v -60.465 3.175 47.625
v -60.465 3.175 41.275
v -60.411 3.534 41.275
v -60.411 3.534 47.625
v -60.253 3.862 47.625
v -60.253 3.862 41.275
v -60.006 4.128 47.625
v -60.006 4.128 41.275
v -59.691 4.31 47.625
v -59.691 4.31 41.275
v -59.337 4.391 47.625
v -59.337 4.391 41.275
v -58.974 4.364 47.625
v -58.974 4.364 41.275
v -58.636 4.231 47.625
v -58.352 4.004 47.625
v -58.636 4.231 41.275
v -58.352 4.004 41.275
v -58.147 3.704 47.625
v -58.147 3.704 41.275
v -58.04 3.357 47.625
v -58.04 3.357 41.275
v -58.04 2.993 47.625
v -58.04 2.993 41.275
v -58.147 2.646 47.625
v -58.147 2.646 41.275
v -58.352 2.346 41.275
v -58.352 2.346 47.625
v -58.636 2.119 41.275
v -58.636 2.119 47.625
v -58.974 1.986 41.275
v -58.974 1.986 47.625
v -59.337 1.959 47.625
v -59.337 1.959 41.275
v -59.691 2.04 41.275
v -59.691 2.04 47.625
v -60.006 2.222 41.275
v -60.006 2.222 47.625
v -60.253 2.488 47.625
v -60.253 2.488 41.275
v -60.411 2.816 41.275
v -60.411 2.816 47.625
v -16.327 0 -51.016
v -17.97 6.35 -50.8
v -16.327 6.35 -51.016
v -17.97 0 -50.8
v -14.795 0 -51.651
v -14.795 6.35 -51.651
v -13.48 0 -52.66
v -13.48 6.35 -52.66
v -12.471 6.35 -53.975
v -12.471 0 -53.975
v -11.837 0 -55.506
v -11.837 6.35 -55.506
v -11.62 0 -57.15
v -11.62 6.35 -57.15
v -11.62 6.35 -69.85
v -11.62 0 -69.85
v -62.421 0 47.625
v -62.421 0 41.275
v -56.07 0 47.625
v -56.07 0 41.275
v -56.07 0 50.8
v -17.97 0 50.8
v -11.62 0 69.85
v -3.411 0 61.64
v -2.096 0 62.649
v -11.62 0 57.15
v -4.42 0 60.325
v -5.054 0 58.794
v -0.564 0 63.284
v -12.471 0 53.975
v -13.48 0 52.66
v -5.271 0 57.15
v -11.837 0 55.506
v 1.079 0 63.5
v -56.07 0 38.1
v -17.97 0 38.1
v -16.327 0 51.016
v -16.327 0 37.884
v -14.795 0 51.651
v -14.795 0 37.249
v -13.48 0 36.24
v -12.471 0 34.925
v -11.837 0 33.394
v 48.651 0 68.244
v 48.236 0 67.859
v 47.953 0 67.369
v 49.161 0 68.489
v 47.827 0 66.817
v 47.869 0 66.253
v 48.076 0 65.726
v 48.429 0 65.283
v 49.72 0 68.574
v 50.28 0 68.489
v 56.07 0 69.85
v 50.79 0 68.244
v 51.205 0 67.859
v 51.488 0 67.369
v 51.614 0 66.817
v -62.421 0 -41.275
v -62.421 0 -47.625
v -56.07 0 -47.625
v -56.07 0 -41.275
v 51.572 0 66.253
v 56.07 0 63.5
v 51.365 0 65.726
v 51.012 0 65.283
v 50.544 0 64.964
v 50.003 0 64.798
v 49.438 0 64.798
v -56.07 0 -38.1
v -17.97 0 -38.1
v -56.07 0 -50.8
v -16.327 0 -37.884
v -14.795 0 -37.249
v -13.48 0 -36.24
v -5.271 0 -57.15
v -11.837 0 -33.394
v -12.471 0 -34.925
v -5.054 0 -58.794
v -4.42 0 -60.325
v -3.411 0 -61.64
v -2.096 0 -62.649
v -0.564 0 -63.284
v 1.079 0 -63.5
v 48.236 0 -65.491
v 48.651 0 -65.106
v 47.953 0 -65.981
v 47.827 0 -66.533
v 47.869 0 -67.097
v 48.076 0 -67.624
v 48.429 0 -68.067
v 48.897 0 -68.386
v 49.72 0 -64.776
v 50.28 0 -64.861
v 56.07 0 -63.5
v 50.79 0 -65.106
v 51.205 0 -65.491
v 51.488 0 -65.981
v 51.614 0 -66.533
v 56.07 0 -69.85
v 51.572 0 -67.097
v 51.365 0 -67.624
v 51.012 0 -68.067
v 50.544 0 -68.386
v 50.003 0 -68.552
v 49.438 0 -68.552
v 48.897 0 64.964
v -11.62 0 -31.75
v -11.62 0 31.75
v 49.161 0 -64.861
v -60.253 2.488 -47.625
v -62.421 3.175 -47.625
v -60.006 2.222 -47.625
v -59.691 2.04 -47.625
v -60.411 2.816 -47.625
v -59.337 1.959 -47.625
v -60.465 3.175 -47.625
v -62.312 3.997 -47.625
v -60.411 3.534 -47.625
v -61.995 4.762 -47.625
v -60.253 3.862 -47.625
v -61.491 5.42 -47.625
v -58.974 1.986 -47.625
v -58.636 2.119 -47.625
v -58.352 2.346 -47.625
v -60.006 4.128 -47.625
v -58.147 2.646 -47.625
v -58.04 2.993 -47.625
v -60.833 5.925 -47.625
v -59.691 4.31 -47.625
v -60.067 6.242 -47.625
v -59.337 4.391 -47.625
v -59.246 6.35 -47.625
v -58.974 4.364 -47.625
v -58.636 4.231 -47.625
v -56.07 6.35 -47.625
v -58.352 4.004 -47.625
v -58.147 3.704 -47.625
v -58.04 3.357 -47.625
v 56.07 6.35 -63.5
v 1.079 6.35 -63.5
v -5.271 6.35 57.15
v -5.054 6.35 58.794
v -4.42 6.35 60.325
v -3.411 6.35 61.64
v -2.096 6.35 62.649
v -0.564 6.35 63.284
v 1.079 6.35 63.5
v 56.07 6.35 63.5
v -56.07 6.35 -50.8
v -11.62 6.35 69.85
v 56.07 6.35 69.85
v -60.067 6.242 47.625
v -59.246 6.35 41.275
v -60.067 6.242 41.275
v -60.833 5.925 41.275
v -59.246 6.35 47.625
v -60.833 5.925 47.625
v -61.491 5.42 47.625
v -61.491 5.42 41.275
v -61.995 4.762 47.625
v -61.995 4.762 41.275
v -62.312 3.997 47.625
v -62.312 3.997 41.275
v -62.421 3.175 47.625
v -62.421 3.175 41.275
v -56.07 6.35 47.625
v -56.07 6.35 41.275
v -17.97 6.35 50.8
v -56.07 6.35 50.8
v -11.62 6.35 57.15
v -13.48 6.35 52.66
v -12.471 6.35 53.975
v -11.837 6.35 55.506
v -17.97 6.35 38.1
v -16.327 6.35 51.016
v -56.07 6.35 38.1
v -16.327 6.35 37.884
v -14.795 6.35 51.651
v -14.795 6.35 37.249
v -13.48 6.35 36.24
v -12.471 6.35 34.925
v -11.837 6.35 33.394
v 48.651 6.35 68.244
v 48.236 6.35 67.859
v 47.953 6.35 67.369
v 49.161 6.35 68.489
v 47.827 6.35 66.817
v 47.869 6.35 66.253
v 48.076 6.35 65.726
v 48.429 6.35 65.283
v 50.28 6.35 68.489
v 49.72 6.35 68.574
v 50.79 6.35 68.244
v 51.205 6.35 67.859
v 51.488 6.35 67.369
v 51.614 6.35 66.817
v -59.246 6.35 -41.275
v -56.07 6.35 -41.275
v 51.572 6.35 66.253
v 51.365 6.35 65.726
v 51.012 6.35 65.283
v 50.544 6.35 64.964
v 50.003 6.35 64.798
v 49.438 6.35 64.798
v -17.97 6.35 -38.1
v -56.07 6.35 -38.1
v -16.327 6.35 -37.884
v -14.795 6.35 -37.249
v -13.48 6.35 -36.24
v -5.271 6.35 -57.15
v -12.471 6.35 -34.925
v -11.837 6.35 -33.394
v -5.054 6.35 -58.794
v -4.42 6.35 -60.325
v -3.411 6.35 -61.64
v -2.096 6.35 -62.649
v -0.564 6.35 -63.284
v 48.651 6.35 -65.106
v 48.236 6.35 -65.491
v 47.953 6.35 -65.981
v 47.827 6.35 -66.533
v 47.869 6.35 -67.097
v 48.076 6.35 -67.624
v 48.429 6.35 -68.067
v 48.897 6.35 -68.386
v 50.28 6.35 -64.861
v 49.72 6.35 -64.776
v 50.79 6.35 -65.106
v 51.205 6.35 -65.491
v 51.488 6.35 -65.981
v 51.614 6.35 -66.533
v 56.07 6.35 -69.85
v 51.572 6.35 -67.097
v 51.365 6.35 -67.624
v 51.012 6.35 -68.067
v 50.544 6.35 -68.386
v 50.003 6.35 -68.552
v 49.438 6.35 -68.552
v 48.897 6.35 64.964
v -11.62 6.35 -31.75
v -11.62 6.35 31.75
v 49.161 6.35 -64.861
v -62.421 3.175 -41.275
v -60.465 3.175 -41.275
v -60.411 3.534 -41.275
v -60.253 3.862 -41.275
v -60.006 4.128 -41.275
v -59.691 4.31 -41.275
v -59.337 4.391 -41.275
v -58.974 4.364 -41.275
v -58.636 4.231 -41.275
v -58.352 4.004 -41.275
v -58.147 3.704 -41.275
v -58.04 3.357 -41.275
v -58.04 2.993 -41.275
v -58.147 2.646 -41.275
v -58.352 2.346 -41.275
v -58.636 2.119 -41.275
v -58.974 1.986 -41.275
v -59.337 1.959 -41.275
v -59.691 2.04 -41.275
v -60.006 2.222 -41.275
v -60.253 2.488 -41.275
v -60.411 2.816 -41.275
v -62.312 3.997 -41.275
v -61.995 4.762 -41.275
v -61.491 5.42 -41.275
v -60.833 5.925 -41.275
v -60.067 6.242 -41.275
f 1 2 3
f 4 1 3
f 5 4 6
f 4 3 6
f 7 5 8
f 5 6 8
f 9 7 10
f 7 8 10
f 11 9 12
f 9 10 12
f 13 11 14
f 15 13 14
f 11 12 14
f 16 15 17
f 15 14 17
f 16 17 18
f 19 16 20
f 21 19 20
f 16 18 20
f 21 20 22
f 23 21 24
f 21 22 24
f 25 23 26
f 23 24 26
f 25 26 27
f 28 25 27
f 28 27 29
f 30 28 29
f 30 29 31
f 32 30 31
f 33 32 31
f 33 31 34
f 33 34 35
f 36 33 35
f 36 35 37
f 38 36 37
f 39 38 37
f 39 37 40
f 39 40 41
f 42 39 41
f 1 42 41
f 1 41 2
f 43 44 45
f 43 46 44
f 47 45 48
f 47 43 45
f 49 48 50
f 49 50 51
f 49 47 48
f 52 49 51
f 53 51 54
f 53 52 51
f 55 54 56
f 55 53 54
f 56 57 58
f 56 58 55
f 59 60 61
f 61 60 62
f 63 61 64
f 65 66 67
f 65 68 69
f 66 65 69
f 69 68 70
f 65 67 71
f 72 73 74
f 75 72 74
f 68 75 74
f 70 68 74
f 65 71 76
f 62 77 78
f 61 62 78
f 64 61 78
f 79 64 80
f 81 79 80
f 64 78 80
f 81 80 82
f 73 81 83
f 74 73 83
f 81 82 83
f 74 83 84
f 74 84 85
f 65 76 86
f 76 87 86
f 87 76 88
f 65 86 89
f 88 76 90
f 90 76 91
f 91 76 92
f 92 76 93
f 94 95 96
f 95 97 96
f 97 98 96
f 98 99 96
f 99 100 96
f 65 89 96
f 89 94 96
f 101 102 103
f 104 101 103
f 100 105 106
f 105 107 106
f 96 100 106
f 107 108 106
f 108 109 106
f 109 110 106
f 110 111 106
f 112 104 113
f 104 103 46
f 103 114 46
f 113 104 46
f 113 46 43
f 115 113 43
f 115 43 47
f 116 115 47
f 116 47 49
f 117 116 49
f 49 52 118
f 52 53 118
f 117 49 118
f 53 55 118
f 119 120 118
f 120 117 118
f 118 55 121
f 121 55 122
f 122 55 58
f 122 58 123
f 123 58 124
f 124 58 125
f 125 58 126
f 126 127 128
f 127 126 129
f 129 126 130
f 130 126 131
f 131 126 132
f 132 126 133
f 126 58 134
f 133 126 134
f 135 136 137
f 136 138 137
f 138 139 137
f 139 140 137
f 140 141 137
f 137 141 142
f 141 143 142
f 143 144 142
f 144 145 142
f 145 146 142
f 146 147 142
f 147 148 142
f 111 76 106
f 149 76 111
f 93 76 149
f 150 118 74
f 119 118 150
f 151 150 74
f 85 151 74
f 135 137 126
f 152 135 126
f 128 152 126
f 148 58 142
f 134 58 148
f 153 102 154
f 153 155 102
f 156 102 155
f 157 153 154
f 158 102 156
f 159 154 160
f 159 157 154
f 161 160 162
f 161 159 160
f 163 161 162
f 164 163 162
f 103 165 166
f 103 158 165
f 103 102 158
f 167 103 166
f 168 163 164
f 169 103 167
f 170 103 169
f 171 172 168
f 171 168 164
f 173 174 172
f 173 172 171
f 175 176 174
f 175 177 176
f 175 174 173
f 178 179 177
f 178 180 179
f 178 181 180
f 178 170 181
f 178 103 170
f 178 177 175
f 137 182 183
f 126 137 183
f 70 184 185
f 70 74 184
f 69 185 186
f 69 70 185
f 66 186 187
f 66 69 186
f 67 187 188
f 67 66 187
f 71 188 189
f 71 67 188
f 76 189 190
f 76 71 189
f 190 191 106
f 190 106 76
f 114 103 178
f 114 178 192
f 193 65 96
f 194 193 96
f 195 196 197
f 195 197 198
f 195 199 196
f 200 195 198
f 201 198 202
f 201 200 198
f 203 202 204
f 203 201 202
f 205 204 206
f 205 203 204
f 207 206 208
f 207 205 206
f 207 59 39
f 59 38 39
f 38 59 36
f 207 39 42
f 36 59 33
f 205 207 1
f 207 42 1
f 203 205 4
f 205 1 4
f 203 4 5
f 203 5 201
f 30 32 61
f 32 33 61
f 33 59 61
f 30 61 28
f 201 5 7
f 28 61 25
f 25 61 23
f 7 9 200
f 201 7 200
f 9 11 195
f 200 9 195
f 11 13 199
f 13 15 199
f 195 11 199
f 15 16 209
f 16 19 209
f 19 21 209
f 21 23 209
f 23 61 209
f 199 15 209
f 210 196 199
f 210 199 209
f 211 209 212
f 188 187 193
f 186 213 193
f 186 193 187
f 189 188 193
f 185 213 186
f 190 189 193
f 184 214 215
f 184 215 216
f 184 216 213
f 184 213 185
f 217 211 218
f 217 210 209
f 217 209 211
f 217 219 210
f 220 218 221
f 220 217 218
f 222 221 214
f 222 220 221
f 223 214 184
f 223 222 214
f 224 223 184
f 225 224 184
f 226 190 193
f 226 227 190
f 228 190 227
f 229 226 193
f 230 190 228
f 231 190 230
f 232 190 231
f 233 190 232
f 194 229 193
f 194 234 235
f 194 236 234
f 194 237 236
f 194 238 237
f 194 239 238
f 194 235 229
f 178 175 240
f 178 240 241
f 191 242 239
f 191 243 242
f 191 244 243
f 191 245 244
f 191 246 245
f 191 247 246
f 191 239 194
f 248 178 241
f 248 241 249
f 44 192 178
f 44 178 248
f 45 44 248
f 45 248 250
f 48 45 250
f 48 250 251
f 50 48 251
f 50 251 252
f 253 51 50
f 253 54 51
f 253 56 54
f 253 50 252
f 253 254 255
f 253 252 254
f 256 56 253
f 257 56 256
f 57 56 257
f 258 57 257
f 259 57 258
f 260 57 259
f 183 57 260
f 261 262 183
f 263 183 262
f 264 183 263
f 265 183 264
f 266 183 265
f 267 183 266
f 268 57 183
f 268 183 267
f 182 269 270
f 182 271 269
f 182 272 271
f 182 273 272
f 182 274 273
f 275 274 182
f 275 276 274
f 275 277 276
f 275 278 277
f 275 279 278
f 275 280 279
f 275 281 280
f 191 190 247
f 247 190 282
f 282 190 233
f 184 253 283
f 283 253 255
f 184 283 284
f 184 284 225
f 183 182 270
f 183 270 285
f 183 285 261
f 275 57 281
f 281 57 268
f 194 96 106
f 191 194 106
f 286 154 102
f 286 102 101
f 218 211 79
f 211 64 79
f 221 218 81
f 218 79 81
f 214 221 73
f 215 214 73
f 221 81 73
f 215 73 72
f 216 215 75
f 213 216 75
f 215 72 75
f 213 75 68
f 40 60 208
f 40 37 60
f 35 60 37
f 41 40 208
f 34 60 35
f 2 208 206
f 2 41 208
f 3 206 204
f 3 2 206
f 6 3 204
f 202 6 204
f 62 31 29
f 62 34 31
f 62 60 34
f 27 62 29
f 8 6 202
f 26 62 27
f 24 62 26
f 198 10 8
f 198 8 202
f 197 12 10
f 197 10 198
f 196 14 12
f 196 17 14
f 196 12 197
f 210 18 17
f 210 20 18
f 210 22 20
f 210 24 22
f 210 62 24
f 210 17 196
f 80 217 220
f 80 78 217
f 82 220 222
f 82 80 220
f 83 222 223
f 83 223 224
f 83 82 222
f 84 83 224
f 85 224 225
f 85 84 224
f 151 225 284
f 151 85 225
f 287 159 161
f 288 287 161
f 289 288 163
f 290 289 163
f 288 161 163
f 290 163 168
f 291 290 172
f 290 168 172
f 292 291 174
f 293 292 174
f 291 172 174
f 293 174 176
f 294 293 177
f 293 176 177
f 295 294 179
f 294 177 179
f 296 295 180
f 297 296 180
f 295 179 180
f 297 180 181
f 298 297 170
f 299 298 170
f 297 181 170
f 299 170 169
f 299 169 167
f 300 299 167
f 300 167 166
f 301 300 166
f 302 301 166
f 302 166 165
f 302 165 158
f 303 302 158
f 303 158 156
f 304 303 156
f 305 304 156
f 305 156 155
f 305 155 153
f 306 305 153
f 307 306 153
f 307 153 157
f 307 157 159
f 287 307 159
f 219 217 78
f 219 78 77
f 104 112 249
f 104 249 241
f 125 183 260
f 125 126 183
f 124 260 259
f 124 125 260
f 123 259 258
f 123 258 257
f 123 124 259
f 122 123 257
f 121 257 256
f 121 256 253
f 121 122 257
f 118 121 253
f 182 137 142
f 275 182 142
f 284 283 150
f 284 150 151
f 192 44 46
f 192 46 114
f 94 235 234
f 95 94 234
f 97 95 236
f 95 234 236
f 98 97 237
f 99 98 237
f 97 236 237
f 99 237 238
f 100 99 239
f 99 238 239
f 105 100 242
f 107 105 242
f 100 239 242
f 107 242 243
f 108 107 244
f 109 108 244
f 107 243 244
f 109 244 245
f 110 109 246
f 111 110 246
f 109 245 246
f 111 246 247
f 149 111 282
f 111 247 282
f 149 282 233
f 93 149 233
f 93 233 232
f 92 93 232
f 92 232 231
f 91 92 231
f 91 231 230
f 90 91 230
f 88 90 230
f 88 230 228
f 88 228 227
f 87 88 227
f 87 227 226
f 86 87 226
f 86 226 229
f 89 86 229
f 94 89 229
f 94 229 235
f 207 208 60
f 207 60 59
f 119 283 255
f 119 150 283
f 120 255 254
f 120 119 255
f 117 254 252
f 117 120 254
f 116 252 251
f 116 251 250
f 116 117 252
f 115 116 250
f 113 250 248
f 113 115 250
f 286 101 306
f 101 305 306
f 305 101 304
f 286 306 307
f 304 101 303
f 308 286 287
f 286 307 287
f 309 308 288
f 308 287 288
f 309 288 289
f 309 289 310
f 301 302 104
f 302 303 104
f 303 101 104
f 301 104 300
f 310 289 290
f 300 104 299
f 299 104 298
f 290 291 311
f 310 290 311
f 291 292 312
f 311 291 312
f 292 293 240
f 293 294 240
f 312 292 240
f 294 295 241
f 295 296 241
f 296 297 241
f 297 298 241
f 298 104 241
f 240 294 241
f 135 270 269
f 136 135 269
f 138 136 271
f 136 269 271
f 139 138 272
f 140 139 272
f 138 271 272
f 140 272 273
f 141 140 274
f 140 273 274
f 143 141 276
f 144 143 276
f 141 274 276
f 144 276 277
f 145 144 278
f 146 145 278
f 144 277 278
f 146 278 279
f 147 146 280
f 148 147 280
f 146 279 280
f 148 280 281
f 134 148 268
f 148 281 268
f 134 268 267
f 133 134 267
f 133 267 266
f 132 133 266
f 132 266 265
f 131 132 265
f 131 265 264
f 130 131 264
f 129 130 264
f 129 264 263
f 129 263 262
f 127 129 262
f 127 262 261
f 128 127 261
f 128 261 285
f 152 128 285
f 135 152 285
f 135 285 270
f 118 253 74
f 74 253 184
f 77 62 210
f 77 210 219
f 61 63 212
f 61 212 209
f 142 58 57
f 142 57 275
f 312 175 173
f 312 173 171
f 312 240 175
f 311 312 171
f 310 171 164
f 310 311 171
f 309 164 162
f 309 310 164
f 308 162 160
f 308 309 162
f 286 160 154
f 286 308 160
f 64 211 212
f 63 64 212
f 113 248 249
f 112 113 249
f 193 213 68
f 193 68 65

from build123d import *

# Parameters (mm, degrees)
SKETCH1_W                 = 112.141
SKETCH1_H                 = 139.7
EXTRUDE1_DEPTH            = 6.35
SKETCH2_W                 = 44.45
SKETCH2_H                 = 19.05
SKETCH2_W_2               = 61.341
SKETCH2_H_2               = 127
SKETCH2_H_3               = 76.2
CUT_EXTRUDE1_DEPTH        = 6.35
FILLET1_R                 = 6.35
SKETCH5_W                 = 6.35
SKETCH5_H                 = 6.35
EXTRUDE2_DEPTH            = 6.35
FILLET2_R                 = 3.175
F_6_CLEARANCE_HOLE1_D     = 3.7973
F_6_CLEARANCE_HOLE1_DEPTH = 12.7
F_6_CLEARANCE_HOLE1_TIP   = 1.140824014
F_2_CLEARANCE_HOLE1_D     = 2.4384


with BuildPart() as part:
    # Sketch1 → Extrude1 (new body)
    with BuildSketch(Plane(origin=(0, 0, 0), x_dir=(1, 0, 0), z_dir=(0, 1, 0))):
        Rectangle(SKETCH1_W, SKETCH1_H)
    extrude(amount=EXTRUDE1_DEPTH)

    # Sketch2 → Cut-Extrude1 (cut)
    with BuildSketch(Plane(origin=(0, 6.35, 0), x_dir=(-1, 0, 0), z_dir=(0, 1, 0))):
        with Locations((33.8455, -60.325)):
            Rectangle(SKETCH2_W, SKETCH2_H)
        with Locations((33.8455, 60.325)):
            Rectangle(SKETCH2_W, SKETCH2_H)
        with Locations((-25.4, 0)):
            Rectangle(SKETCH2_W_2, SKETCH2_H_2)
        with Locations((33.8455, 0)):
            Rectangle(SKETCH2_W, SKETCH2_H_3)
    extrude(amount=-CUT_EXTRUDE1_DEPTH, mode=Mode.SUBTRACT)

    # Fillet1
    fillet1_edges = [part.edges().sort_by_distance(p)[0] for p in [
        (-11.6205, 3.175, -50.8),
        (-11.6205, 3.175, 50.8),
        (-5.2705, 3.175, 63.5),
        (-5.2705, 3.175, -63.5),
        (-11.6205, 3.175, -38.1),
        (-11.6205, 3.175, 38.1),
    ]]
    fillet(fillet1_edges, radius=FILLET1_R)

    # Sketch5 → Extrude2 (add)
    with BuildSketch(Plane.ZY.offset(56.0705)):
        with Locations((44.45, 3.175)):
            Rectangle(SKETCH5_W, SKETCH5_H)
        with Locations((-44.45, 3.175)):
            Rectangle(SKETCH5_W, SKETCH5_H)
    extrude(amount=EXTRUDE2_DEPTH)

    # Fillet2
    fillet2_edges = [part.edges().sort_by_distance(p)[0] for p in [
        (-62.4205, 6.35, 44.45),
        (-62.4205, 6.35, -44.45),
    ]]
    fillet(fillet2_edges, radius=FILLET2_R)

    # #6 Clearance Hole1
    with Locations(Plane(origin=(49.7205, 0, 66.675), x_dir=(0, 0, -1), z_dir=(0, -1, 0))):
        with Locations((0, 0), (133.35, 0)):
            Hole(F_6_CLEARANCE_HOLE1_D / 2, depth=F_6_CLEARANCE_HOLE1_DEPTH)
            with Locations((0, 0, -(F_6_CLEARANCE_HOLE1_DEPTH + F_6_CLEARANCE_HOLE1_TIP / 2))):  # 118° drill point
                Cone(0, F_6_CLEARANCE_HOLE1_D / 2, F_6_CLEARANCE_HOLE1_TIP, mode=Mode.SUBTRACT)

    # #2 Clearance Hole1 (through all)
    with Locations(Plane(origin=(-59.2455, 3.175, 47.625), x_dir=(1, 0, 0), z_dir=(0, 0, 1))):
        with Locations((0, 0)):
            Hole(F_2_CLEARANCE_HOLE1_D / 2)


solid = part.part
